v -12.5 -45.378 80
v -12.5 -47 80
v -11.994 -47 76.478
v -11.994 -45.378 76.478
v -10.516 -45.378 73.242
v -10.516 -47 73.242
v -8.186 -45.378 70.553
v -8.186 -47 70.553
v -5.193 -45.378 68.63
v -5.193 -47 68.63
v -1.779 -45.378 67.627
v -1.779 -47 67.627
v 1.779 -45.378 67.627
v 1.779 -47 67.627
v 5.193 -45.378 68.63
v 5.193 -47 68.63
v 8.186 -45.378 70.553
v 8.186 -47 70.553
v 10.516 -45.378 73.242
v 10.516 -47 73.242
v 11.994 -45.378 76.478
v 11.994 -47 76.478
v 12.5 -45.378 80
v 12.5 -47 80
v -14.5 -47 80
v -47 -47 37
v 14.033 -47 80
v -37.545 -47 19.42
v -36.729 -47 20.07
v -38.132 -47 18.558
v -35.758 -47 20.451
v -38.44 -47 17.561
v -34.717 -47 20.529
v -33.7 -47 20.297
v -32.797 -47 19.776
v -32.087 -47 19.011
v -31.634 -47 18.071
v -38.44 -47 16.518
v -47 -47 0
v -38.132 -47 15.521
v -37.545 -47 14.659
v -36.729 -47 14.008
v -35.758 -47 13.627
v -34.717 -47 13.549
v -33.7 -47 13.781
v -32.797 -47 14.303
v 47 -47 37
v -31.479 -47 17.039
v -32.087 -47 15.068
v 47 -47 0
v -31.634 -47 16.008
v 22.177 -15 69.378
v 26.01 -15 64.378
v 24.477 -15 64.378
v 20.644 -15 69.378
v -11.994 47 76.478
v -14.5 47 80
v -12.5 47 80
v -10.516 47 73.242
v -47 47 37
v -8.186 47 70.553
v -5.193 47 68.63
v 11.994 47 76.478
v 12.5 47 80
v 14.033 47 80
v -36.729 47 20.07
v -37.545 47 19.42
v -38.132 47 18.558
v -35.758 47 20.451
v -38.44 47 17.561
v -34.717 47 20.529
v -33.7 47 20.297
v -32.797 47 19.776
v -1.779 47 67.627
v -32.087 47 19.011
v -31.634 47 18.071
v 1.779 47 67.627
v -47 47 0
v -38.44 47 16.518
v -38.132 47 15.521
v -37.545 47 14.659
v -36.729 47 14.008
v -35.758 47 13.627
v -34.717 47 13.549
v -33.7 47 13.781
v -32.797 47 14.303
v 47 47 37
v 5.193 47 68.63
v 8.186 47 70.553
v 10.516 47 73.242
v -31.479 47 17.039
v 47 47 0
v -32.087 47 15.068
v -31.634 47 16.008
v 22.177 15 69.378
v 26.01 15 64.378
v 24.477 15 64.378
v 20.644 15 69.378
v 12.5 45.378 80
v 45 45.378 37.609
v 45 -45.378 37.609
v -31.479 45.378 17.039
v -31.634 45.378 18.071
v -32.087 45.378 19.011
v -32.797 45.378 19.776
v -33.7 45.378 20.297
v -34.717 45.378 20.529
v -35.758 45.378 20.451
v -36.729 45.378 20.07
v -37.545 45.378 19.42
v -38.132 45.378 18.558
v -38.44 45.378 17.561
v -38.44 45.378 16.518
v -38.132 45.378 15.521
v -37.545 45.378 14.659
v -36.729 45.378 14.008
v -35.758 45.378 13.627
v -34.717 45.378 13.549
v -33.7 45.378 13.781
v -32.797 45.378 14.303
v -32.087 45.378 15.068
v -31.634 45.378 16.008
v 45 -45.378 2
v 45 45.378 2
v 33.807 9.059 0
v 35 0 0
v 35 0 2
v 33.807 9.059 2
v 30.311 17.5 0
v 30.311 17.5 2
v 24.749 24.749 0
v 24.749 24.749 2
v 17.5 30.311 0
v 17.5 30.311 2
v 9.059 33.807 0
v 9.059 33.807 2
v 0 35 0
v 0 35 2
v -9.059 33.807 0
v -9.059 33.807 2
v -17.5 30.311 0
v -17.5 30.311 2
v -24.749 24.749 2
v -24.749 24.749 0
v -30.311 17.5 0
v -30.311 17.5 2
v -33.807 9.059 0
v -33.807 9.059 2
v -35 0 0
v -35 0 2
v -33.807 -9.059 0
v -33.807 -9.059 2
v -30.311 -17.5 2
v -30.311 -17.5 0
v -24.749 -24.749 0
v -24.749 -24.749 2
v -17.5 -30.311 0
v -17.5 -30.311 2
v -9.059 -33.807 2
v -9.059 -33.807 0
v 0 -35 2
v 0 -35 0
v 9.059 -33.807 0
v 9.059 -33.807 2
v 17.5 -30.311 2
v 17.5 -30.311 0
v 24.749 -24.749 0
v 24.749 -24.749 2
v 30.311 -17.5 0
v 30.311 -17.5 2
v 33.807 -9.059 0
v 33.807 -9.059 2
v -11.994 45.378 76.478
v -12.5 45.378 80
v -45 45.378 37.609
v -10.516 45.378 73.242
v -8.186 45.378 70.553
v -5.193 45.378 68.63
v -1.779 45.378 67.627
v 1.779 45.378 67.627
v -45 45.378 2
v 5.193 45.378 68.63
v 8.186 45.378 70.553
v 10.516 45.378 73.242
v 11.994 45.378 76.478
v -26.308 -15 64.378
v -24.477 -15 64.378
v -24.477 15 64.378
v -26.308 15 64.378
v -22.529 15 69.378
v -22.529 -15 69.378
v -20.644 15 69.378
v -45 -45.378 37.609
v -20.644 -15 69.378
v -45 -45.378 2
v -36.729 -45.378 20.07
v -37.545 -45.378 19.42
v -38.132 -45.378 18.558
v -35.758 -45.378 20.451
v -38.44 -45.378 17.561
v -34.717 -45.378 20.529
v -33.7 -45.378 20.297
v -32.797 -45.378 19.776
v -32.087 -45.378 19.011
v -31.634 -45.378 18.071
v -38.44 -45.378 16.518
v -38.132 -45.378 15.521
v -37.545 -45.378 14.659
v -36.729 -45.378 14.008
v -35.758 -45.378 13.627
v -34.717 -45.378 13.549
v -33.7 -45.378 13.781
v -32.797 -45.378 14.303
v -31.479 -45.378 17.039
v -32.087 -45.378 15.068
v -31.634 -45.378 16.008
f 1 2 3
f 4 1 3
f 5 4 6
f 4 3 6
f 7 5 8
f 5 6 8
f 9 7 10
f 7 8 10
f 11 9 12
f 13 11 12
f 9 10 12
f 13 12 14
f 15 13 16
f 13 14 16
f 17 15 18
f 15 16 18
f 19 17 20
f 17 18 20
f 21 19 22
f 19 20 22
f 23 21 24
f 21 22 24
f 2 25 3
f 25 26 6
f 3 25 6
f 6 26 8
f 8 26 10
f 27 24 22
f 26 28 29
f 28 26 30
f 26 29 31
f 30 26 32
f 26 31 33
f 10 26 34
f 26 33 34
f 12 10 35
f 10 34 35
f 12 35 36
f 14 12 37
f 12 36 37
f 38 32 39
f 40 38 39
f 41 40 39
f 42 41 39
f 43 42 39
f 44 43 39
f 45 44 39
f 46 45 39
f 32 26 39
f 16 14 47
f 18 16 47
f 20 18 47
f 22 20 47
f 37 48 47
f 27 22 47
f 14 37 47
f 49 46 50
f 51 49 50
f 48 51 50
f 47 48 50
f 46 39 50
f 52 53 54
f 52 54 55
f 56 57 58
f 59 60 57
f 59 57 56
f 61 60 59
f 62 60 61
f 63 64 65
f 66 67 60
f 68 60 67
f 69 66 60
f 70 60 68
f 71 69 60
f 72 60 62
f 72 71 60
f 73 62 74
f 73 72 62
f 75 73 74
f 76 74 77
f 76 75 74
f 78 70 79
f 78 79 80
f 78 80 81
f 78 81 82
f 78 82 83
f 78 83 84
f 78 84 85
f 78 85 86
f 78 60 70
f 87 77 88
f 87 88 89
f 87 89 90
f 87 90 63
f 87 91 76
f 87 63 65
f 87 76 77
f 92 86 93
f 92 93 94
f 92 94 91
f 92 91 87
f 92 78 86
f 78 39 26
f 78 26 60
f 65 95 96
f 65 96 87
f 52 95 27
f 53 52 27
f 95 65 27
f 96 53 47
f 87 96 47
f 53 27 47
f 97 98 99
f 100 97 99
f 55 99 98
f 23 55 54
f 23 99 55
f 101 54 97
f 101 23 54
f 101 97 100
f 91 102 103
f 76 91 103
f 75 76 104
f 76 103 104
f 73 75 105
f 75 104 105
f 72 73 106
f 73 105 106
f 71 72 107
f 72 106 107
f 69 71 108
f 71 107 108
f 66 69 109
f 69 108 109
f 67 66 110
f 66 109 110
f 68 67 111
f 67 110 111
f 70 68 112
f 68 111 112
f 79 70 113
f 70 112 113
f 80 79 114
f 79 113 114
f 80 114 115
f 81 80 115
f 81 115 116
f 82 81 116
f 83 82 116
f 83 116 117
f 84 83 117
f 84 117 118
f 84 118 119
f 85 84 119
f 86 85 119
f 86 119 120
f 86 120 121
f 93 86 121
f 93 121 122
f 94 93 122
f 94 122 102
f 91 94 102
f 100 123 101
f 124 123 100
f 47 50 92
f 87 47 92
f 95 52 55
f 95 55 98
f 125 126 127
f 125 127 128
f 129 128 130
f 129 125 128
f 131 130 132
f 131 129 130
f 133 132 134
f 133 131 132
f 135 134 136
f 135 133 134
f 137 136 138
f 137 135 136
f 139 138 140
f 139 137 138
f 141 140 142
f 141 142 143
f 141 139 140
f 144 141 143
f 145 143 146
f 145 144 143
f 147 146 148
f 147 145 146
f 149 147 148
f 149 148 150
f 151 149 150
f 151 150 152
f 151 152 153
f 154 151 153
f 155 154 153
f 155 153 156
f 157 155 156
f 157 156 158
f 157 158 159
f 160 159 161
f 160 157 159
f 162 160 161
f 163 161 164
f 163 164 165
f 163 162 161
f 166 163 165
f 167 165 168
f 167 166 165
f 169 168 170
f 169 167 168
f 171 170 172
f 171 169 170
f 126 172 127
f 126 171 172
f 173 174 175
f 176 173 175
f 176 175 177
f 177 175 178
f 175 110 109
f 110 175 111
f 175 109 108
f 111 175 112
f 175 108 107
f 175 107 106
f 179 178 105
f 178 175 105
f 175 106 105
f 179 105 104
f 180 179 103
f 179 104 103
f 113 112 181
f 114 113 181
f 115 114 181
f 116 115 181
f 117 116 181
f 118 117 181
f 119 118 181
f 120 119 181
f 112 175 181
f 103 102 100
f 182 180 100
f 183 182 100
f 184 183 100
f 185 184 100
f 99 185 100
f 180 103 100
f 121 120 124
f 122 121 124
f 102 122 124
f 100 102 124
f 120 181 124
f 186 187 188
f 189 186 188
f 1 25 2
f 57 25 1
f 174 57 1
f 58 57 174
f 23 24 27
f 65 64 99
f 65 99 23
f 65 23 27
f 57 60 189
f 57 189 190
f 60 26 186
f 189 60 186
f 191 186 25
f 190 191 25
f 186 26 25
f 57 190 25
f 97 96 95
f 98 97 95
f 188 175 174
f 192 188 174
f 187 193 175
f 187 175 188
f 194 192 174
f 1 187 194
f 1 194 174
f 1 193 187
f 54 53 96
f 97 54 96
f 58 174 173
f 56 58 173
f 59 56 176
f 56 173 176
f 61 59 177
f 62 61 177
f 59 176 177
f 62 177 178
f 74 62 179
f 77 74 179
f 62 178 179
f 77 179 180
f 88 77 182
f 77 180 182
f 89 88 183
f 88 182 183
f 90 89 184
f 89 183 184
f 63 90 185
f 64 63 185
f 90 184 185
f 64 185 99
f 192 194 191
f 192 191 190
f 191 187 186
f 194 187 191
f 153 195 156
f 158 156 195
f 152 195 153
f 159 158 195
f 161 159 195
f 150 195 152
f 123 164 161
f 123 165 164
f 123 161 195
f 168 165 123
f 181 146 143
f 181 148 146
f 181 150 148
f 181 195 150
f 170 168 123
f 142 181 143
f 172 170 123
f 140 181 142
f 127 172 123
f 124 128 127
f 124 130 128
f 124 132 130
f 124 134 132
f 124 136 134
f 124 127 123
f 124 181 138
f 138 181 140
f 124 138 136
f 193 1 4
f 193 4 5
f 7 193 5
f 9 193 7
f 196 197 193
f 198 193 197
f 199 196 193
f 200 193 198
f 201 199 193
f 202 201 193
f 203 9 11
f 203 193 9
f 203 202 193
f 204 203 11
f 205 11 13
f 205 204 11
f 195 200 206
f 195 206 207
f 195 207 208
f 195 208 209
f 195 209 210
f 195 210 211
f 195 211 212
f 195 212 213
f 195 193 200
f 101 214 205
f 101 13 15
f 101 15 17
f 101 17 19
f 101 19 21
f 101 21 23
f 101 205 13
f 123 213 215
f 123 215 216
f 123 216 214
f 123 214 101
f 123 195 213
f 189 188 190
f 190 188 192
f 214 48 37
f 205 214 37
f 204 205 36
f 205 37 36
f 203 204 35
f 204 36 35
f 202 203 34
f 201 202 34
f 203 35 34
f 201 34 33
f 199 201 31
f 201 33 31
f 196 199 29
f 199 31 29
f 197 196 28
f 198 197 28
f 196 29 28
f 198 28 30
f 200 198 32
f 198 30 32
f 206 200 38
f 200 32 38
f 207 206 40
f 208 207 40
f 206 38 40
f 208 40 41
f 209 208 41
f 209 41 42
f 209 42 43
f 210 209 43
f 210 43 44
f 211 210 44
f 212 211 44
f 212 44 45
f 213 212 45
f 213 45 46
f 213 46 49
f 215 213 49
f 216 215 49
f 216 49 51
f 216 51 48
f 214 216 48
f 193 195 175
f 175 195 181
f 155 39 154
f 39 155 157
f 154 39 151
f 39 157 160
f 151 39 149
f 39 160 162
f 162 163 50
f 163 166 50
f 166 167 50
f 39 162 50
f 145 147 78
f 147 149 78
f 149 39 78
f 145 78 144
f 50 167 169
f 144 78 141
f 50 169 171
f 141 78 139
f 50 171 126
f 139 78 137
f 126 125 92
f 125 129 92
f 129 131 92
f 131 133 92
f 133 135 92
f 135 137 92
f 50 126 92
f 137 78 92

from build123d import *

# Parameters (mm, degrees)
F0_W     = 94
F0_H     = 94
F0_W_2   = 90
F0_H_2   = 90.7552093267
F0_R     = 35
F1_DEPTH = 2
F2_DEPTH = 80
F3_R     = 3.5
F4_DEPTH = 100
F5_DEPTH = 150
F6_DEPTH = 94
F7_W     = 30
F7_H     = 5
F8_DEPTH = 100


with BuildPart() as f1:
    # F0 (on Top) → F1 (new body)
    with BuildSketch(Plane.XY):
        Rectangle(F0_W, F0_H)
        Rectangle(F0_W_2, F0_H_2, mode=Mode.SUBTRACT)
        Rectangle(F0_W_2, F0_H_2)
        Circle(F0_R, mode=Mode.SUBTRACT)
    extrude(amount=F1_DEPTH)

    # F0 (on Top) → F2 (join)
    with BuildSketch(Plane.XY):
        Rectangle(F0_W, F0_H)
        Rectangle(F0_W_2, F0_H_2, mode=Mode.SUBTRACT)
    extrude(amount=F2_DEPTH)

    # F3 (on face) → F4 (cut)
    with BuildSketch(Plane.XZ.offset(47)):
        with BuildLine():
            ThreePointArc((-12.5, 80), (0, 67.5), (12.5, 80))
            Line((12.5, 80), (-12.5, 80))
        make_face()
        with Locations((-34.9789150059, 17.0391555876)):
            Circle(F3_R)
    extrude(amount=-F4_DEPTH, mode=Mode.SUBTRACT)

    # F3 (on face) → F5 (cut)
    with BuildSketch(Plane.XZ.offset(47)):
        Polygon((-47, 37), (-14.5, 80), (-47, 80), align=None)
        Polygon((47, 80), (14.0333333333, 80), (47, 37), align=None)
    extrude(amount=-F5_DEPTH, mode=Mode.SUBTRACT)

    # F3 (on face) → F6 (join)
    with BuildSketch(Plane.XZ.offset(47)):
        Polygon((-47, 35), (-12.5, 80), (-14.5, 80), (-47, 37), align=None)
        Polygon((14.0333333333, 80), (12.5, 80), (47, 35), (47, 37), align=None)
    extrude(amount=-F6_DEPTH)

    # F7 (on face) → F8 (cut)
    with BuildSketch(Plane.YZ.offset(47)):
        with Locations((0, 66.8776729703)):
            Rectangle(F7_W, F7_H)
    extrude(amount=-F8_DEPTH, mode=Mode.SUBTRACT)


solid = f1.part
